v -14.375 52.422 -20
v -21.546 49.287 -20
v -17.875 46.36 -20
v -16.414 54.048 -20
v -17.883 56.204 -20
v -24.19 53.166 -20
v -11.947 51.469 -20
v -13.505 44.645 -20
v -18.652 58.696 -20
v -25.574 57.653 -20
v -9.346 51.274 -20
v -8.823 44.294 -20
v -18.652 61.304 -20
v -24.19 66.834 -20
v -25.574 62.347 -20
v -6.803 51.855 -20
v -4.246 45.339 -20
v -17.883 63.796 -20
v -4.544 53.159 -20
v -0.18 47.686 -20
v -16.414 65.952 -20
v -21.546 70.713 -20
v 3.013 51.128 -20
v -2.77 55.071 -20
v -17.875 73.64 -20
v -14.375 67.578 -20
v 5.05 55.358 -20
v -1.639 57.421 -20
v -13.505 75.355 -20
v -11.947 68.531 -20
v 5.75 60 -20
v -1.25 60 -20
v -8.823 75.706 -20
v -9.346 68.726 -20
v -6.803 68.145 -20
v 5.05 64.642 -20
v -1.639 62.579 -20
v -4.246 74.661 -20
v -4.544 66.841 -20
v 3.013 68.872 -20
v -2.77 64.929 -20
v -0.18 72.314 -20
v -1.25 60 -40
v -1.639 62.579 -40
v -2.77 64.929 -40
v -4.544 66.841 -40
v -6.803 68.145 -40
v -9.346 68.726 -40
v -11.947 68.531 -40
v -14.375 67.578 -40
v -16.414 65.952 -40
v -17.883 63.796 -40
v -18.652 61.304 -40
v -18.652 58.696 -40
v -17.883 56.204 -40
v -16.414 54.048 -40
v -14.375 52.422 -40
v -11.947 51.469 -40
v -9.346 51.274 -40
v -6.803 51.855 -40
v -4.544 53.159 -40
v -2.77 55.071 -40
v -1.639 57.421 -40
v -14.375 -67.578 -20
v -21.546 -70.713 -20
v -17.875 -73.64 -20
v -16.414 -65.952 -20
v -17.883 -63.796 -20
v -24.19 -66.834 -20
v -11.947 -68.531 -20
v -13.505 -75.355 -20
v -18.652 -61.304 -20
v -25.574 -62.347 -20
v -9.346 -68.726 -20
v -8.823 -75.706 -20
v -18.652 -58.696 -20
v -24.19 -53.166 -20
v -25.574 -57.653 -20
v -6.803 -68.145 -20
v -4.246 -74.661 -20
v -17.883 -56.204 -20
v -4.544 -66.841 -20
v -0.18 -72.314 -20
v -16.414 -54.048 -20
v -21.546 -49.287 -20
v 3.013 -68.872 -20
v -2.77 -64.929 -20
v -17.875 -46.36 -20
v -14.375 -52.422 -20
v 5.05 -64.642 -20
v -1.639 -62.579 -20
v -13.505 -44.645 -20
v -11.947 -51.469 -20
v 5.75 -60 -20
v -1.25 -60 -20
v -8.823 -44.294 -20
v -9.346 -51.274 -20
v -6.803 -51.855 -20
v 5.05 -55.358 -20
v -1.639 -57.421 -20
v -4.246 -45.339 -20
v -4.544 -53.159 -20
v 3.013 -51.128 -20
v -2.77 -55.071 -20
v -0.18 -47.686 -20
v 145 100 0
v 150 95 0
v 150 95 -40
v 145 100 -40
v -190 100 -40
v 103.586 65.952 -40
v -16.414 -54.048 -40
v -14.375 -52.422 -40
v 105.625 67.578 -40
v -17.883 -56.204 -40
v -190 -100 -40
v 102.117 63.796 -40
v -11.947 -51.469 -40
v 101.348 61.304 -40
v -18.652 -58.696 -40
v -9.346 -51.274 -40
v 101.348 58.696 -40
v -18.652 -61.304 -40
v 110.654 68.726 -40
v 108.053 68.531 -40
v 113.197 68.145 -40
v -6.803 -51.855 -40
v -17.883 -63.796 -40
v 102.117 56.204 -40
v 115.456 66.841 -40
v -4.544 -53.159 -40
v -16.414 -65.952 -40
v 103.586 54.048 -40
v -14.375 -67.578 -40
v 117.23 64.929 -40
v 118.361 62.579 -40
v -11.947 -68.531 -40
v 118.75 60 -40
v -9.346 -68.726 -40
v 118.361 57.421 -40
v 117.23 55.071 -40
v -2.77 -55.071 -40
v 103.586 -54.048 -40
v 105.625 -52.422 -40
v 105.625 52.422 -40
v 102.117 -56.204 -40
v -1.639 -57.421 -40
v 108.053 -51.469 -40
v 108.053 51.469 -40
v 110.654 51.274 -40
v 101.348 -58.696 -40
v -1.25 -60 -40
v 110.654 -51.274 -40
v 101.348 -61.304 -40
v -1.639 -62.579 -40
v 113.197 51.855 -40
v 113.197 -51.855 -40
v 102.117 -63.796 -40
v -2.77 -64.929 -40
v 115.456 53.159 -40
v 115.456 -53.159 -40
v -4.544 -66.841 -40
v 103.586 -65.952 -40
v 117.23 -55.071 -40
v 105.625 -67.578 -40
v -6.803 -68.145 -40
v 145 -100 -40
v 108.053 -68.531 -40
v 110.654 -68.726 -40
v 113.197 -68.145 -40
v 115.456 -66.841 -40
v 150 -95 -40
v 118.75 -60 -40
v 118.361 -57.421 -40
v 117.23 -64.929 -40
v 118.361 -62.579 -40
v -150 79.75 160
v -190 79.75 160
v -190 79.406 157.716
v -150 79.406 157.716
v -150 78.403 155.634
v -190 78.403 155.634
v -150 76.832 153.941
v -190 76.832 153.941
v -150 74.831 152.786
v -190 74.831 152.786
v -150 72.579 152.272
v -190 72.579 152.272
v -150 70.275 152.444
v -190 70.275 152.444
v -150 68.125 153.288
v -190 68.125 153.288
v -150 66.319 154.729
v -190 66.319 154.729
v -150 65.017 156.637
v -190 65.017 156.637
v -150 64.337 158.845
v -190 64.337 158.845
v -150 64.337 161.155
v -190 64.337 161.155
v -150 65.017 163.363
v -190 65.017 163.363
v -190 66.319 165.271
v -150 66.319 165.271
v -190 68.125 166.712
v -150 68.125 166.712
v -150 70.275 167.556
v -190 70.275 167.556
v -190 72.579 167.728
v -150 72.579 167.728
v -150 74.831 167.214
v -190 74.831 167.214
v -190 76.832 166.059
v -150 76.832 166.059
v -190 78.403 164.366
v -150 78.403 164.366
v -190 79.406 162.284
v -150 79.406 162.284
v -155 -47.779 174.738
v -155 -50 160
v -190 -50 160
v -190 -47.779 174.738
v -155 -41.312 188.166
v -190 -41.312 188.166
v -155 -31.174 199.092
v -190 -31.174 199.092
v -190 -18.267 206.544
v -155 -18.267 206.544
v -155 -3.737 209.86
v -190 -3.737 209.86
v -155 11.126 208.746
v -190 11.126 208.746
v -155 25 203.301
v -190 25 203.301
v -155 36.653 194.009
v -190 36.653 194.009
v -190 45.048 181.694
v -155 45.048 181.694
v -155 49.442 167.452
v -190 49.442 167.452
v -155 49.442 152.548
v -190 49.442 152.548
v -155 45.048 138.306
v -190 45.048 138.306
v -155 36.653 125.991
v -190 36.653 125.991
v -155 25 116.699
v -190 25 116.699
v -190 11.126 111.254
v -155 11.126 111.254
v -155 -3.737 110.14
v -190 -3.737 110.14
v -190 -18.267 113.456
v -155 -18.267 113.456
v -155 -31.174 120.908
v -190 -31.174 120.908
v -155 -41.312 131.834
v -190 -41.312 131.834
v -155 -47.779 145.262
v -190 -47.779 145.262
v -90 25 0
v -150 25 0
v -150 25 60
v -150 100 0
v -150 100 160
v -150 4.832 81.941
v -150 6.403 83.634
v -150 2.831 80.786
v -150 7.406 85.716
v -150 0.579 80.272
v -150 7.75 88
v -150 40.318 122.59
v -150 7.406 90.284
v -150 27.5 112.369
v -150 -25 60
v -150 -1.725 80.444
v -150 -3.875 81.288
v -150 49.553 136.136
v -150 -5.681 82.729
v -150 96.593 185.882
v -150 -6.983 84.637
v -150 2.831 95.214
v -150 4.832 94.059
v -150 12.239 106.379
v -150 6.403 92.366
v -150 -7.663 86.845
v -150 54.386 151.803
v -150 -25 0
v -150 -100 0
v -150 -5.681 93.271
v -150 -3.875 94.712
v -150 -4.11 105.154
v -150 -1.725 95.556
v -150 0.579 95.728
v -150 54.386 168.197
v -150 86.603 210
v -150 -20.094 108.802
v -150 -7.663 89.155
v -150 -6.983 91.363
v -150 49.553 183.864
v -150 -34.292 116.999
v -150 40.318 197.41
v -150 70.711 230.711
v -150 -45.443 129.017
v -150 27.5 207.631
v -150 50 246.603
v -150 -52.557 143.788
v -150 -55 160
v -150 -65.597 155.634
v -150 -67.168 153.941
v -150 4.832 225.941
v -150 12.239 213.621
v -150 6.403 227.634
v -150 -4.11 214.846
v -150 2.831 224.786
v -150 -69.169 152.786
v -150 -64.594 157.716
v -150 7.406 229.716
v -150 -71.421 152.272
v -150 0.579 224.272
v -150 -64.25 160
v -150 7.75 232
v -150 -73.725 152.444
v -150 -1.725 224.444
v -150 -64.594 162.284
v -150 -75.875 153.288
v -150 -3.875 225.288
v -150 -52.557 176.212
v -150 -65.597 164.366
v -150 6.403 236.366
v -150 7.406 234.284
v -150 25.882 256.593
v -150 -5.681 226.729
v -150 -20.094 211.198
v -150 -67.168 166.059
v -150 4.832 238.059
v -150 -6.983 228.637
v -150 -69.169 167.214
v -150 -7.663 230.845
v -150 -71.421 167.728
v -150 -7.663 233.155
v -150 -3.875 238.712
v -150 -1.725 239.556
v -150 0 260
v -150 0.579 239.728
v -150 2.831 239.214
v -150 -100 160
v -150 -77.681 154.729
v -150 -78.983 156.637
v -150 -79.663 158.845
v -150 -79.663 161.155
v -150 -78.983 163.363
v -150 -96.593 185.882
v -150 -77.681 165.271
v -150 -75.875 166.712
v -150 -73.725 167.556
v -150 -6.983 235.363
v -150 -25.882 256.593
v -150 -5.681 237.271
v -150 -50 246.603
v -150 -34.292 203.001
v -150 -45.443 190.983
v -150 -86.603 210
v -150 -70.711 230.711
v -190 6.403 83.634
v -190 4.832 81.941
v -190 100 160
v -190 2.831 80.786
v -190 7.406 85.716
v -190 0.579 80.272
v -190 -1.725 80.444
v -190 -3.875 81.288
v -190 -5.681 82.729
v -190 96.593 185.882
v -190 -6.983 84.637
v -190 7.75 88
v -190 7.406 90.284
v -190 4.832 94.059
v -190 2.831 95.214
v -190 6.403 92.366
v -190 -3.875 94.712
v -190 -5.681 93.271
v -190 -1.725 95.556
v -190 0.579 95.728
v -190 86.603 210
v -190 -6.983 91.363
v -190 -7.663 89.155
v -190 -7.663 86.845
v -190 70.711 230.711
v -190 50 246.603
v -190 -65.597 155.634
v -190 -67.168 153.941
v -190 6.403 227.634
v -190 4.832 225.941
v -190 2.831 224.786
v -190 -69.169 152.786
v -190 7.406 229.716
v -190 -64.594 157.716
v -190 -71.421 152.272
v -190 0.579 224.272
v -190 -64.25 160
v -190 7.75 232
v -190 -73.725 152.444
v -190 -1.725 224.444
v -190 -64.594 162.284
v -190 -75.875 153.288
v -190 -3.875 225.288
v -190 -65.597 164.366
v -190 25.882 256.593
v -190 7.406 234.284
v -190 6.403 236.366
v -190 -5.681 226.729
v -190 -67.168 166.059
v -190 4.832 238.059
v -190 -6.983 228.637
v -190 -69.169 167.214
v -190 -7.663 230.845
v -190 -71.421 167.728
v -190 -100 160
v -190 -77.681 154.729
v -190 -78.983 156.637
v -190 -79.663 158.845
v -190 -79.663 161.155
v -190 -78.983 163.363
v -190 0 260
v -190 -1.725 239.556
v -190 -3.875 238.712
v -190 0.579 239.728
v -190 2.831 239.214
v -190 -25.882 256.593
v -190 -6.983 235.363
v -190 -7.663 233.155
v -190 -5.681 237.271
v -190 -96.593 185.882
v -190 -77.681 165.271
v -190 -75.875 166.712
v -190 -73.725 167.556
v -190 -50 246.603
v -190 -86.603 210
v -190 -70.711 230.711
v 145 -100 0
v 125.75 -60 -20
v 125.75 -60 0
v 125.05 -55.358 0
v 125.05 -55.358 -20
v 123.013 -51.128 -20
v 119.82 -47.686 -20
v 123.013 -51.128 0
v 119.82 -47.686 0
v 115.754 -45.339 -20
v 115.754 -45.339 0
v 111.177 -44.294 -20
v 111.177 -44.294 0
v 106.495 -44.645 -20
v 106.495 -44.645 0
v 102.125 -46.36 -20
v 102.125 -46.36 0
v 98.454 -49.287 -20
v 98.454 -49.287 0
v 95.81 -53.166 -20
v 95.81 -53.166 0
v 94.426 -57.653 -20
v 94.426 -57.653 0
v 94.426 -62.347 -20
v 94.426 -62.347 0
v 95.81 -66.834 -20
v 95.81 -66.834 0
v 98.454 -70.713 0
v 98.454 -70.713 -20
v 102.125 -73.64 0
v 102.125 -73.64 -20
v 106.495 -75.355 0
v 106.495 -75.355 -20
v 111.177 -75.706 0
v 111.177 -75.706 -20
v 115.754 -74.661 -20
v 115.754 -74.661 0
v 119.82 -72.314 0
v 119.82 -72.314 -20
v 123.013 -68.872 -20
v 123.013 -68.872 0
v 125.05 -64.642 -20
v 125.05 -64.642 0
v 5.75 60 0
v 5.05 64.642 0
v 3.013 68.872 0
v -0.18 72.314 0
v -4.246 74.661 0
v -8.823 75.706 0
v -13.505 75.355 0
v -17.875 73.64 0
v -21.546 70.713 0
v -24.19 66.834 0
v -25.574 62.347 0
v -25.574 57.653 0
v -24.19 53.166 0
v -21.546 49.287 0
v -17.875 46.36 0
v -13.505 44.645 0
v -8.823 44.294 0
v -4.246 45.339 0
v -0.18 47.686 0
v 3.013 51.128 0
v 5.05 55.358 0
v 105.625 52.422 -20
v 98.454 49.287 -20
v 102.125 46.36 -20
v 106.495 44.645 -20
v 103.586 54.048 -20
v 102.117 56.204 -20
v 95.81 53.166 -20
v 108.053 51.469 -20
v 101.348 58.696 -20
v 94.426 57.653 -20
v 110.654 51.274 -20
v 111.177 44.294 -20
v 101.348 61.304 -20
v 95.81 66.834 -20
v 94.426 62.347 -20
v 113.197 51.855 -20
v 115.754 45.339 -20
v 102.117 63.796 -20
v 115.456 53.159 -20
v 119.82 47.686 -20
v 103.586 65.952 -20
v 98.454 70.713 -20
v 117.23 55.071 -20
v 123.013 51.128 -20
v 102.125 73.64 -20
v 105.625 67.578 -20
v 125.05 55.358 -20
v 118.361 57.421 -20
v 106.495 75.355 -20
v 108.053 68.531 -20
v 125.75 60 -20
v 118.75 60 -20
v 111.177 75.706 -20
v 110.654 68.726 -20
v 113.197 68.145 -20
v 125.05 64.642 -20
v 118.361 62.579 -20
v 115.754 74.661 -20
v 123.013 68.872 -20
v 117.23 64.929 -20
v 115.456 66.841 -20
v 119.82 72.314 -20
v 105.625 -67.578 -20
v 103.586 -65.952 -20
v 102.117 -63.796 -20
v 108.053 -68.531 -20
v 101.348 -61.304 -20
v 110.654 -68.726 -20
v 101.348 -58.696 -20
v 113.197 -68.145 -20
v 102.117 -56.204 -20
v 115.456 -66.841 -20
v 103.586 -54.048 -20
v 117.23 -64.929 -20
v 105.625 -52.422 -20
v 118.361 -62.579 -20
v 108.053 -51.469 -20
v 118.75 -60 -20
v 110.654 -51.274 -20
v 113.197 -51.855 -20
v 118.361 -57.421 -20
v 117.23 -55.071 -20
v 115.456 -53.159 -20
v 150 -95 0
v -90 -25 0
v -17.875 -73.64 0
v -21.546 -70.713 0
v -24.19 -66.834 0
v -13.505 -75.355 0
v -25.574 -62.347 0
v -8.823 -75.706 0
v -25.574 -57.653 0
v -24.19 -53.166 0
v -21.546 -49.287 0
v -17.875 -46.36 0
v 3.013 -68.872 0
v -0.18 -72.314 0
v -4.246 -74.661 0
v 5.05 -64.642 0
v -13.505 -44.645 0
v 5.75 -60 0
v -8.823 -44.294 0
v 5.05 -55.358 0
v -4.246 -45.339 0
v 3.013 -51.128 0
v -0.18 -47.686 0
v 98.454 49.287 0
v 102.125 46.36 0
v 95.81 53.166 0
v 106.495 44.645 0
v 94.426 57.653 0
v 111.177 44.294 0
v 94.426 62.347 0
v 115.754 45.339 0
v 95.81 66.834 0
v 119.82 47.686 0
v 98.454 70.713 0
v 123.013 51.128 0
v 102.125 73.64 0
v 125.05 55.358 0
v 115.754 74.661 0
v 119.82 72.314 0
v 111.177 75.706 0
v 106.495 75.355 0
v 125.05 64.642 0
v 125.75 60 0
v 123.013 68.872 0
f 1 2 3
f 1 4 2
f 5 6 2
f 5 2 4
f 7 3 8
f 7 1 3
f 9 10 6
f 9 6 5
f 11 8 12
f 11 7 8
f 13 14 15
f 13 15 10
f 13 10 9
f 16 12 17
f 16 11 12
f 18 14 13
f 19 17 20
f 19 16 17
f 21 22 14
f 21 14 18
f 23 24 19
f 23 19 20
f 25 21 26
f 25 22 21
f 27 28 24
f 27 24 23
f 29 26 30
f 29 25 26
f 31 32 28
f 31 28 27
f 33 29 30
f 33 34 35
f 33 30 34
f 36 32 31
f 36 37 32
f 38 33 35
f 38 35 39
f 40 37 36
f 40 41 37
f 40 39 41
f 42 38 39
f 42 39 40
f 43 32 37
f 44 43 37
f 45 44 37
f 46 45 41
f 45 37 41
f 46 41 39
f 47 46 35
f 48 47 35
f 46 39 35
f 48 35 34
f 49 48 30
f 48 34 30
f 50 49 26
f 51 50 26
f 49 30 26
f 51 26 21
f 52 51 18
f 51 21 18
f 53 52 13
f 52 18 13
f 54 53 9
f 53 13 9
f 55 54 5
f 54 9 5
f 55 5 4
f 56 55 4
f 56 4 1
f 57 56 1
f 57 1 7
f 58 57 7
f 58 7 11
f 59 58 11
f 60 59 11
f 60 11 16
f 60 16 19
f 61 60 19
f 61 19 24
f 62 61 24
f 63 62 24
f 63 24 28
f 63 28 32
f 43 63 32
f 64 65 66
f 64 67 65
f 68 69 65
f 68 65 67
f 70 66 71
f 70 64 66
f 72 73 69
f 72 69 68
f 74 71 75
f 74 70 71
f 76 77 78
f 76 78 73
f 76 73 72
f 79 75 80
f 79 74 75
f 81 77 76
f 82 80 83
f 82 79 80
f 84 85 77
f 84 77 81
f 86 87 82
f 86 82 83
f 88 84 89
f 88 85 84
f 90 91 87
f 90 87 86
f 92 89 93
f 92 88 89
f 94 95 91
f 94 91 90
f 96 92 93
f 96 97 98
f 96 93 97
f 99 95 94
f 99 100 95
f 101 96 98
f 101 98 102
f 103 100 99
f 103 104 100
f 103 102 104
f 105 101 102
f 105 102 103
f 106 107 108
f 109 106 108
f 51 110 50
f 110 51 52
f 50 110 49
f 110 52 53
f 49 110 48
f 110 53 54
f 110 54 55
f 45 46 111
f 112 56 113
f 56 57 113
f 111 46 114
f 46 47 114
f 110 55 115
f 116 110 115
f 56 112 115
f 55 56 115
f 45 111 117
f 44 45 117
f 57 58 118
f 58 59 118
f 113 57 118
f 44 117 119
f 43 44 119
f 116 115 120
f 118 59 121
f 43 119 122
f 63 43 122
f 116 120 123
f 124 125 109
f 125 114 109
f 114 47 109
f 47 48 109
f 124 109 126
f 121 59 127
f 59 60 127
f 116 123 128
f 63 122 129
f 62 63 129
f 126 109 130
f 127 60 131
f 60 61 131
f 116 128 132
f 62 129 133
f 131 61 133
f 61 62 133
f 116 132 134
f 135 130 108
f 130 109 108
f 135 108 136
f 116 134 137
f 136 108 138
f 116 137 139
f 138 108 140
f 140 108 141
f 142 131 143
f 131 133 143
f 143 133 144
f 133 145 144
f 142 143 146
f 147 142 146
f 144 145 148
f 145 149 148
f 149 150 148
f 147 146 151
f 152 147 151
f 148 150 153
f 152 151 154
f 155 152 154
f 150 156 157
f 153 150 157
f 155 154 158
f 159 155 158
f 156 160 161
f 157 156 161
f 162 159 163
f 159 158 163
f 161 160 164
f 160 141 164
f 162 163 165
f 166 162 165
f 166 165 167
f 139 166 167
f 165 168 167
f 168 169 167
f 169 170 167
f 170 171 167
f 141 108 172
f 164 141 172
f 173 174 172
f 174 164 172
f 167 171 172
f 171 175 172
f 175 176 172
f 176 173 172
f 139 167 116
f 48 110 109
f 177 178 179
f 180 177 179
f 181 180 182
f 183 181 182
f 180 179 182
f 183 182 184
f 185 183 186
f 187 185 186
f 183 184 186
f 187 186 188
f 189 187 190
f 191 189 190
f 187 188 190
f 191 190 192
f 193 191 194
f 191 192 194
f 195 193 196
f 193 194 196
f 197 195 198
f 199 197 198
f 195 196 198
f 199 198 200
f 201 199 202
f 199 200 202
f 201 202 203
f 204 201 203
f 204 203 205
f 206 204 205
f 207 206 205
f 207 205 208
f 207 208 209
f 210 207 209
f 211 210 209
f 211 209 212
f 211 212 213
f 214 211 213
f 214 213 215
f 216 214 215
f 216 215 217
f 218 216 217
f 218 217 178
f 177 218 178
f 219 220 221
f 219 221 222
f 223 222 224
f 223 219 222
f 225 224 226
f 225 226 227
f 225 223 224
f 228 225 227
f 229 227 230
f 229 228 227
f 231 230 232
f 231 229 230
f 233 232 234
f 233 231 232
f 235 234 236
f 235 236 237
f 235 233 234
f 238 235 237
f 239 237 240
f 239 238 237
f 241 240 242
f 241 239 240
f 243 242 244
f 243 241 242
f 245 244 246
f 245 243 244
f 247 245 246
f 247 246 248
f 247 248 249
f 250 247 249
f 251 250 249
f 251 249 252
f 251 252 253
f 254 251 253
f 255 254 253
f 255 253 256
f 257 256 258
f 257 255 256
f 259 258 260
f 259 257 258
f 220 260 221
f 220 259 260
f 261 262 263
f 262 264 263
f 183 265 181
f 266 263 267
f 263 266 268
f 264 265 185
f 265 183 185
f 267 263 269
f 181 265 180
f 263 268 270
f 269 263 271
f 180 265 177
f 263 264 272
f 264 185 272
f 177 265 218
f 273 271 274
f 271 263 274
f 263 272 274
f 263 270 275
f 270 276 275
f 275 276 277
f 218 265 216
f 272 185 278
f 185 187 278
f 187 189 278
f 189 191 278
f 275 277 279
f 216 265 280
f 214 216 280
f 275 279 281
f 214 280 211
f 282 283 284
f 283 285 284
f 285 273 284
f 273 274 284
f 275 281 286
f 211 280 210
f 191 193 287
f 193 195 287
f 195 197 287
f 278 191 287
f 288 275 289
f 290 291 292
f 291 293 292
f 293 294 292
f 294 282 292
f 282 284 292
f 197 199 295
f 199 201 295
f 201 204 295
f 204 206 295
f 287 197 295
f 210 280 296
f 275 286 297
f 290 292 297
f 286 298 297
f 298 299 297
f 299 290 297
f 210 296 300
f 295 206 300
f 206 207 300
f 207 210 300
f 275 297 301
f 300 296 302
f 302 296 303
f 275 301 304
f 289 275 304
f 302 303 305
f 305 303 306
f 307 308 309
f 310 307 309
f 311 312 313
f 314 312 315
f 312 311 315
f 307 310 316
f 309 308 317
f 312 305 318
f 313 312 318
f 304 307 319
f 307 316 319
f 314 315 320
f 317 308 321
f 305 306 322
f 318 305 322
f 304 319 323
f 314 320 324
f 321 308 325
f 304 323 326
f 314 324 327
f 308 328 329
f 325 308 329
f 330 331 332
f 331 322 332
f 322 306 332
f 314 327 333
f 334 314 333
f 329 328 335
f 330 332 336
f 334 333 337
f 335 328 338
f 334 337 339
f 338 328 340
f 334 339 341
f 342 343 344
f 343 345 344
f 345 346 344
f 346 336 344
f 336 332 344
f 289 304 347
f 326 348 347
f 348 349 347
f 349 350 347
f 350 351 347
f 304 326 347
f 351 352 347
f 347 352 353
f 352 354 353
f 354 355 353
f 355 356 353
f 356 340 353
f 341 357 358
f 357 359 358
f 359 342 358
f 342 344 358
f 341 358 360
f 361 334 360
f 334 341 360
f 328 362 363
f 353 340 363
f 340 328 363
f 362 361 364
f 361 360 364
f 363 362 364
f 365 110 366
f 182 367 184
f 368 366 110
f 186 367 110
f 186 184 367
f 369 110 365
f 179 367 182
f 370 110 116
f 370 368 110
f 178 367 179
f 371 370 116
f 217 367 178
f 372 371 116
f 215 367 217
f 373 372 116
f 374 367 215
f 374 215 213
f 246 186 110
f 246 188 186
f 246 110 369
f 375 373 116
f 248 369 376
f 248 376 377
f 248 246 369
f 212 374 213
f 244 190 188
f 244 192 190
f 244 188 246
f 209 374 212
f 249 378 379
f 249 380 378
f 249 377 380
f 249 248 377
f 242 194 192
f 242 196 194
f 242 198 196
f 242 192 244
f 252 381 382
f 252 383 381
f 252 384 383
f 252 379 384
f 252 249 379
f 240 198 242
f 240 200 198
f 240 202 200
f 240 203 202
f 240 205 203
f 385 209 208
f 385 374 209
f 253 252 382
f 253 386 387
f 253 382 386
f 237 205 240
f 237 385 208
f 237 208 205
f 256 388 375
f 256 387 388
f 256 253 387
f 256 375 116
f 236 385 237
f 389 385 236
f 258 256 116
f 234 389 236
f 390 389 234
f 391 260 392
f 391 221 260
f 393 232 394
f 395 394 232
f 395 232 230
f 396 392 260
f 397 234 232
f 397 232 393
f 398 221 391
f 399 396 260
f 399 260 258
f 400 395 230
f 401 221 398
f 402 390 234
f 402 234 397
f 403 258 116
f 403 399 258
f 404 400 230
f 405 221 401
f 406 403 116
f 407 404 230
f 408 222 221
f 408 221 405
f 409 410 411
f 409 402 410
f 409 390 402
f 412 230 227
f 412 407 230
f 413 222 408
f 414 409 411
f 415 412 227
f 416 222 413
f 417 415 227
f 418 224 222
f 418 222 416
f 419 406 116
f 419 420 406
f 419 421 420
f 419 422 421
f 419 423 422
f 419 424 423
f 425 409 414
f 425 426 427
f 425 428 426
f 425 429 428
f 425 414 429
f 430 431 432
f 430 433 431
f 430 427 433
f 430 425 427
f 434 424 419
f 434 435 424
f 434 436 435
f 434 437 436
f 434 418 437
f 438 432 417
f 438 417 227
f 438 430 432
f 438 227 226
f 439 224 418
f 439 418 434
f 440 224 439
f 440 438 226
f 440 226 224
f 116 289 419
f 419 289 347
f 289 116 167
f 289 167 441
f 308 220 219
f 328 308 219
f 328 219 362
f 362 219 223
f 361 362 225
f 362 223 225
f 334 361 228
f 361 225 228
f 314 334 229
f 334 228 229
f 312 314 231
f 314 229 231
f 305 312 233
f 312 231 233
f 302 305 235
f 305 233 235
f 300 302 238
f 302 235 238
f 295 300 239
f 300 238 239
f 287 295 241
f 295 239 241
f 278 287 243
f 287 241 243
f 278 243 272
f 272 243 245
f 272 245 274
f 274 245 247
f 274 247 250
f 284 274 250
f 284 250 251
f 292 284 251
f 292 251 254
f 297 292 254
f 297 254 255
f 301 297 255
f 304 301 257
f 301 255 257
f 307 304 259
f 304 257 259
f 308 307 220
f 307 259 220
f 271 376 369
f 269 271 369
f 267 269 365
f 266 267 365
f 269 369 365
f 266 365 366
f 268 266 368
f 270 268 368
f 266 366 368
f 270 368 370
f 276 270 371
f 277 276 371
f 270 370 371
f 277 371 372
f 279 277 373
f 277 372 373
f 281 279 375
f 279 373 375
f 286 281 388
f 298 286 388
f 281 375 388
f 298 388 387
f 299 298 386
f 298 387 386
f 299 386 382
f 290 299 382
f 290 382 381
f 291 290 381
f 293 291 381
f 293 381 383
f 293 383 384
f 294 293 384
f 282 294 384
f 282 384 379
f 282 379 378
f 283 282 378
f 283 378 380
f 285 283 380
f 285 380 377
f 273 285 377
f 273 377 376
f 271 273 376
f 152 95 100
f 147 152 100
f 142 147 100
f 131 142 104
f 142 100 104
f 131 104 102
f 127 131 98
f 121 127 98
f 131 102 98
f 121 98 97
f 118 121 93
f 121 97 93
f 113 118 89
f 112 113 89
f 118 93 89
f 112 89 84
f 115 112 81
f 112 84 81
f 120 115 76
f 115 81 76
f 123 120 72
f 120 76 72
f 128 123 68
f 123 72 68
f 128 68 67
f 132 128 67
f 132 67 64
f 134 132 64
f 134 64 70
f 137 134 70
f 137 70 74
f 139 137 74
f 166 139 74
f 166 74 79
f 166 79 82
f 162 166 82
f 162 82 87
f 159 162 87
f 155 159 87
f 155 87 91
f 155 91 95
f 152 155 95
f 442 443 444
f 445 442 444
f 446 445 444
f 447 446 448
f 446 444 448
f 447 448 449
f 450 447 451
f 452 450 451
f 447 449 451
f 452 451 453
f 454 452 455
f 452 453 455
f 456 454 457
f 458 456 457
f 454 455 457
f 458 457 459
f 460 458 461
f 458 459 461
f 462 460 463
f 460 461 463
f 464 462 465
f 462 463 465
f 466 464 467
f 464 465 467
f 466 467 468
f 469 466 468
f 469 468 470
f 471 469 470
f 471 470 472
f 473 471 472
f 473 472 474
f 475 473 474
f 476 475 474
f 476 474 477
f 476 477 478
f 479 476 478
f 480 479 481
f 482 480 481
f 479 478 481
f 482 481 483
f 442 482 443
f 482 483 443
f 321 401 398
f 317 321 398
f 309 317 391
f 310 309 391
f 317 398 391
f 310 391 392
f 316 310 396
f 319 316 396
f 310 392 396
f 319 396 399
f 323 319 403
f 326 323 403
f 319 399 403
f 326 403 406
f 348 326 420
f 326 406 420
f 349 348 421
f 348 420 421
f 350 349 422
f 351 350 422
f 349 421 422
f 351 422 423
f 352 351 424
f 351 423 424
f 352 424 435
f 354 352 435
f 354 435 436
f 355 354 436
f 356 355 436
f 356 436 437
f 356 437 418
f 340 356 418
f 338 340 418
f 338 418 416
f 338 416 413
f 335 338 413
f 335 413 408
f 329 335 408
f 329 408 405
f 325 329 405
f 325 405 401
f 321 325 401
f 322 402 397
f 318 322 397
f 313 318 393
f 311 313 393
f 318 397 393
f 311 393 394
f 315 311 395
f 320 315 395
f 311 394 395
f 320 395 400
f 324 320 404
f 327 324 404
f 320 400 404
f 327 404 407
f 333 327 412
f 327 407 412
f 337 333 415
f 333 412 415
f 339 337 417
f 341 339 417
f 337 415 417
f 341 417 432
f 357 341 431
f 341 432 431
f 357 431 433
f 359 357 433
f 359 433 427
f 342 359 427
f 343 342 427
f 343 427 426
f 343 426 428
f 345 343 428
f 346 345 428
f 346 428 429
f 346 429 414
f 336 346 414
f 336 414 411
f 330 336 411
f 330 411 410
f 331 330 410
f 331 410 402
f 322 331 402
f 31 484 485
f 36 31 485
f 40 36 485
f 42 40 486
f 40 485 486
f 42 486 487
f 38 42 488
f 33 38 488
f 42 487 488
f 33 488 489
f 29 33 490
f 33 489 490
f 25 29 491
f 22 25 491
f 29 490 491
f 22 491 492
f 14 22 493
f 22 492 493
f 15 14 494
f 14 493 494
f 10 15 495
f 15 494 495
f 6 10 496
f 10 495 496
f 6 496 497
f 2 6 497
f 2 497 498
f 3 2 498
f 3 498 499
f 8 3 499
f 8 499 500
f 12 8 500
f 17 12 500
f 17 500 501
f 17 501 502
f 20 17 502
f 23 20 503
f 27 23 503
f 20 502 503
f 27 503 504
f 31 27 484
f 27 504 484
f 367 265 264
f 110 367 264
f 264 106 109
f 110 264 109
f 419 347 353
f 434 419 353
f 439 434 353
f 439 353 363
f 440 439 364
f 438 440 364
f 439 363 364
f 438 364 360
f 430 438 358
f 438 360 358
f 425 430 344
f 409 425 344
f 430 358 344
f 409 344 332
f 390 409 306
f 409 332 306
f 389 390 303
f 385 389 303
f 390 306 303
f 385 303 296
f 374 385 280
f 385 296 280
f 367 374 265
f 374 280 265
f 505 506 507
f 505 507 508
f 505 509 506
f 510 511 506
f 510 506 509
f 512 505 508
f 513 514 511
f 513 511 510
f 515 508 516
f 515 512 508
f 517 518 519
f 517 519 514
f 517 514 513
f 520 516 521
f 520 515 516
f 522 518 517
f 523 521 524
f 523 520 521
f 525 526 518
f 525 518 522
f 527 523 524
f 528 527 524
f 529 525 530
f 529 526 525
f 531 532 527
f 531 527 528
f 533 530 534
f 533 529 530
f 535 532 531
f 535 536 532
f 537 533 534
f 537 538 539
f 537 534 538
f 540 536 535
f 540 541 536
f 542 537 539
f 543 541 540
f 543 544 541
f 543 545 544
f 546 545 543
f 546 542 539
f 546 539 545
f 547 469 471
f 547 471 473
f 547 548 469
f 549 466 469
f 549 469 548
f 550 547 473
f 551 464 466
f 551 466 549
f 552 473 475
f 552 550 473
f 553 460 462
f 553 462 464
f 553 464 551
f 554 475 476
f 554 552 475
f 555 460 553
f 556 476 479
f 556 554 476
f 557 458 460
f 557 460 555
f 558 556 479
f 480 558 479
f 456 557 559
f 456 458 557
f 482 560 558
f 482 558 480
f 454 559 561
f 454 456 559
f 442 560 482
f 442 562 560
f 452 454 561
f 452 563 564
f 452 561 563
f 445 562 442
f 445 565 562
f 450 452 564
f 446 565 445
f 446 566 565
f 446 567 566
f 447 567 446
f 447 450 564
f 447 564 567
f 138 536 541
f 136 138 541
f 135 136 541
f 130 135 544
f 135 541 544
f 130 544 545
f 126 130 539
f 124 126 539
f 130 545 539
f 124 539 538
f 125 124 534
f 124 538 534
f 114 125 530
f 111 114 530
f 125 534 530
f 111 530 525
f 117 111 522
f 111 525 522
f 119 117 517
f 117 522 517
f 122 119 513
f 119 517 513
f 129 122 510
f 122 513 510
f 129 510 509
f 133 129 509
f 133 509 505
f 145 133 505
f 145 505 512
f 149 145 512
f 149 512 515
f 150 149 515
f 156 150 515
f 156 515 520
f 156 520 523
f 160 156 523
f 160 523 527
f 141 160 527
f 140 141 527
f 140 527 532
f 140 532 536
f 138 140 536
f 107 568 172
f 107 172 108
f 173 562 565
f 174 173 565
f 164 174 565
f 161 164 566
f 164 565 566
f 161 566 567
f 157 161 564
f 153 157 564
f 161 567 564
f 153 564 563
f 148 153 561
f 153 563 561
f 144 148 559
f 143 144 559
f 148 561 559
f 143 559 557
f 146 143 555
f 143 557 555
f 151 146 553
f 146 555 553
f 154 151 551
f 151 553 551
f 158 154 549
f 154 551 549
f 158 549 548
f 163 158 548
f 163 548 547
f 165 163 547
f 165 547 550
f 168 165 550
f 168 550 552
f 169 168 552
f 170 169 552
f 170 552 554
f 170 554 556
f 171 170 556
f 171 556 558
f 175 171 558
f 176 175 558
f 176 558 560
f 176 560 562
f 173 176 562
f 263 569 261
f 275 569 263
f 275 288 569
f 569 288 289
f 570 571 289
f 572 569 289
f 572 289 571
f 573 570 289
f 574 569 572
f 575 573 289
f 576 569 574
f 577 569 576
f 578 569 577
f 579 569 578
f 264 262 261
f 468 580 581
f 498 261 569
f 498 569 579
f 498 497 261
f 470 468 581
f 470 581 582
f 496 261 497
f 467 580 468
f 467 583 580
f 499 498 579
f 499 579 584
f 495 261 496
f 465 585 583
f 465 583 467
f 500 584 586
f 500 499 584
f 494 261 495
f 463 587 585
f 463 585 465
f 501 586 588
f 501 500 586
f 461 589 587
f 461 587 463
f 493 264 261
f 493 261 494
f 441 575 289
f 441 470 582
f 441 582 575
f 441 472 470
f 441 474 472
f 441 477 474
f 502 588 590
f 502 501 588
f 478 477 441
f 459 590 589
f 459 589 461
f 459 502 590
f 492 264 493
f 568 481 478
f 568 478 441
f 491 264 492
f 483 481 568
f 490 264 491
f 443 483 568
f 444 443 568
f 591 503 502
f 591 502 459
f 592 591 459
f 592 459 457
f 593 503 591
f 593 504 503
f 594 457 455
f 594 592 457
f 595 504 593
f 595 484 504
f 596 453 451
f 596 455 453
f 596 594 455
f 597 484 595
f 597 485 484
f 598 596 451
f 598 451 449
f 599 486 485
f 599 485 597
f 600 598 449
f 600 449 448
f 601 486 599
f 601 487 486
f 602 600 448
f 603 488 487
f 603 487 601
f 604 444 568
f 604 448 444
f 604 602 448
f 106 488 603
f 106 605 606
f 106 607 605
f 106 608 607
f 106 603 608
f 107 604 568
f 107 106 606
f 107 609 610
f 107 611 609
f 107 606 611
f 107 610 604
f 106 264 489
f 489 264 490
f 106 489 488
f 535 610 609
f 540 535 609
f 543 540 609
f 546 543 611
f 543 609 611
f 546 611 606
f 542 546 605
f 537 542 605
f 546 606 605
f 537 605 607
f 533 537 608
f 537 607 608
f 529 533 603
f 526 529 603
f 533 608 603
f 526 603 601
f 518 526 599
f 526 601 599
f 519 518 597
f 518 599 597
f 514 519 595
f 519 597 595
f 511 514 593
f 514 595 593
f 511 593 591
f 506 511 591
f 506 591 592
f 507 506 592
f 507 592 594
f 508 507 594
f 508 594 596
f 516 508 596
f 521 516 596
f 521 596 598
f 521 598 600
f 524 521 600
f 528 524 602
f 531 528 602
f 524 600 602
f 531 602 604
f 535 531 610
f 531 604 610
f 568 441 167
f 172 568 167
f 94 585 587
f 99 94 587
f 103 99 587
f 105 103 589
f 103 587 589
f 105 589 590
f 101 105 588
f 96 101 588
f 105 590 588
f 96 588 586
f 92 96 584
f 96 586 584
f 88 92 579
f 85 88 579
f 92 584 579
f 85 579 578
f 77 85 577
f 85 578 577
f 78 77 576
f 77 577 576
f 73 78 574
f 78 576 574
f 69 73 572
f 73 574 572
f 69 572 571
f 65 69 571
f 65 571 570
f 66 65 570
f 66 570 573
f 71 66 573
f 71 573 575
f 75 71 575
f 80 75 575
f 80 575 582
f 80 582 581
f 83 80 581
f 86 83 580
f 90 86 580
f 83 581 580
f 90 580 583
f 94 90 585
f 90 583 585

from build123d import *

# Parameters (mm, degrees)
F0_W     = 300
F0_H     = 200
F0_R     = 15.75
F0_R_2   = 8.75
F1_DEPTH = 40
F2_DEPTH = 20
F3_R     = 50
F4_DEPTH = 40
F5_D     = 15.5
F7_DEPTH = 25
F8_SIZE  = 5


with BuildPart() as f1:
    # F0 (on Top) → F1 (new body)
    with BuildSketch(Plane.XY):
        Rectangle(F0_W, F0_H)
        with Locations((-10, -60)):
            Circle(F0_R, mode=Mode.SUBTRACT)
        with Locations((110, -60)):
            Circle(F0_R, mode=Mode.SUBTRACT)
        with Locations((-10, 60)):
            Circle(F0_R, mode=Mode.SUBTRACT)
        with Locations((110, 60)):
            Circle(F0_R, mode=Mode.SUBTRACT)
        with Locations((-10, 60)):
            Circle(F0_R)
        with Locations((-10, 60)):
            Circle(F0_R_2, mode=Mode.SUBTRACT)
        with Locations((110, 60)):
            Circle(F0_R)
        with Locations((110, 60)):
            Circle(F0_R_2, mode=Mode.SUBTRACT)
        with Locations((-10, -60)):
            Circle(F0_R)
        with Locations((-10, -60)):
            Circle(F0_R_2, mode=Mode.SUBTRACT)
        with Locations((110, -60)):
            Circle(F0_R)
        with Locations((110, -60)):
            Circle(F0_R_2, mode=Mode.SUBTRACT)
    extrude(amount=-F1_DEPTH)

    # F0 (on Top) → F2 (cut)
    with BuildSketch(Plane.XY):
        with Locations((-10, 60)):
            Circle(F0_R)
        with Locations((-10, 60)):
            Circle(F0_R_2, mode=Mode.SUBTRACT)
        with Locations((110, 60)):
            Circle(F0_R)
        with Locations((110, 60)):
            Circle(F0_R_2, mode=Mode.SUBTRACT)
        with Locations((110, -60)):
            Circle(F0_R)
        with Locations((110, -60)):
            Circle(F0_R_2, mode=Mode.SUBTRACT)
        with Locations((-10, -60)):
            Circle(F0_R)
        with Locations((-10, -60)):
            Circle(F0_R_2, mode=Mode.SUBTRACT)
    extrude(amount=-F2_DEPTH, mode=Mode.SUBTRACT)

    # F3 (on face) → F4 (join)
    with BuildSketch(Plane(origin=(-150, 0, 0), x_dir=(0, -1, 0), z_dir=(-1, 0, 0))):
        with BuildLine():
            Line((-100, 160), (-100, -40))
            Line((-100, -40), (100, -40))
            Line((100, -40), (100, 160))
            ThreePointArc((100, 160), (0, 60), (-100, 160))
        make_face()
        with BuildLine():
            ThreePointArc((100, 160), (0, 260), (-100, 160))
            ThreePointArc((-100, 160), (0, 60), (100, 160))
        make_face()
        with Locations((0, 160)):
            Circle(F3_R, mode=Mode.SUBTRACT)
    extrude(amount=F4_DEPTH)

    # F5 (through all)
    with Locations(Plane(origin=(-150, 0, 0), x_dir=(0, -1, 0), z_dir=(1, 0, 0))):
        with Locations((-72, -160), (0, -232), (72, -160), (0, -88)):
            Hole(F5_D / 2)

    # F6 (on Front) → F7 (join, symmetric)
    with BuildSketch(Plane.XZ):
        Polygon((-150, 60), (-150, 0), (-90, 0), align=None)
    extrude(amount=F7_DEPTH, both=True)

    # F8
    f8_edges = [f1.edges().sort_by_distance(p)[0] for p in [
        (150, -100, -20),
        (150, 100, -20),
        (-150, 50, 160),
    ]]
    chamfer(f8_edges, length=F8_SIZE)


solid = f1.part
